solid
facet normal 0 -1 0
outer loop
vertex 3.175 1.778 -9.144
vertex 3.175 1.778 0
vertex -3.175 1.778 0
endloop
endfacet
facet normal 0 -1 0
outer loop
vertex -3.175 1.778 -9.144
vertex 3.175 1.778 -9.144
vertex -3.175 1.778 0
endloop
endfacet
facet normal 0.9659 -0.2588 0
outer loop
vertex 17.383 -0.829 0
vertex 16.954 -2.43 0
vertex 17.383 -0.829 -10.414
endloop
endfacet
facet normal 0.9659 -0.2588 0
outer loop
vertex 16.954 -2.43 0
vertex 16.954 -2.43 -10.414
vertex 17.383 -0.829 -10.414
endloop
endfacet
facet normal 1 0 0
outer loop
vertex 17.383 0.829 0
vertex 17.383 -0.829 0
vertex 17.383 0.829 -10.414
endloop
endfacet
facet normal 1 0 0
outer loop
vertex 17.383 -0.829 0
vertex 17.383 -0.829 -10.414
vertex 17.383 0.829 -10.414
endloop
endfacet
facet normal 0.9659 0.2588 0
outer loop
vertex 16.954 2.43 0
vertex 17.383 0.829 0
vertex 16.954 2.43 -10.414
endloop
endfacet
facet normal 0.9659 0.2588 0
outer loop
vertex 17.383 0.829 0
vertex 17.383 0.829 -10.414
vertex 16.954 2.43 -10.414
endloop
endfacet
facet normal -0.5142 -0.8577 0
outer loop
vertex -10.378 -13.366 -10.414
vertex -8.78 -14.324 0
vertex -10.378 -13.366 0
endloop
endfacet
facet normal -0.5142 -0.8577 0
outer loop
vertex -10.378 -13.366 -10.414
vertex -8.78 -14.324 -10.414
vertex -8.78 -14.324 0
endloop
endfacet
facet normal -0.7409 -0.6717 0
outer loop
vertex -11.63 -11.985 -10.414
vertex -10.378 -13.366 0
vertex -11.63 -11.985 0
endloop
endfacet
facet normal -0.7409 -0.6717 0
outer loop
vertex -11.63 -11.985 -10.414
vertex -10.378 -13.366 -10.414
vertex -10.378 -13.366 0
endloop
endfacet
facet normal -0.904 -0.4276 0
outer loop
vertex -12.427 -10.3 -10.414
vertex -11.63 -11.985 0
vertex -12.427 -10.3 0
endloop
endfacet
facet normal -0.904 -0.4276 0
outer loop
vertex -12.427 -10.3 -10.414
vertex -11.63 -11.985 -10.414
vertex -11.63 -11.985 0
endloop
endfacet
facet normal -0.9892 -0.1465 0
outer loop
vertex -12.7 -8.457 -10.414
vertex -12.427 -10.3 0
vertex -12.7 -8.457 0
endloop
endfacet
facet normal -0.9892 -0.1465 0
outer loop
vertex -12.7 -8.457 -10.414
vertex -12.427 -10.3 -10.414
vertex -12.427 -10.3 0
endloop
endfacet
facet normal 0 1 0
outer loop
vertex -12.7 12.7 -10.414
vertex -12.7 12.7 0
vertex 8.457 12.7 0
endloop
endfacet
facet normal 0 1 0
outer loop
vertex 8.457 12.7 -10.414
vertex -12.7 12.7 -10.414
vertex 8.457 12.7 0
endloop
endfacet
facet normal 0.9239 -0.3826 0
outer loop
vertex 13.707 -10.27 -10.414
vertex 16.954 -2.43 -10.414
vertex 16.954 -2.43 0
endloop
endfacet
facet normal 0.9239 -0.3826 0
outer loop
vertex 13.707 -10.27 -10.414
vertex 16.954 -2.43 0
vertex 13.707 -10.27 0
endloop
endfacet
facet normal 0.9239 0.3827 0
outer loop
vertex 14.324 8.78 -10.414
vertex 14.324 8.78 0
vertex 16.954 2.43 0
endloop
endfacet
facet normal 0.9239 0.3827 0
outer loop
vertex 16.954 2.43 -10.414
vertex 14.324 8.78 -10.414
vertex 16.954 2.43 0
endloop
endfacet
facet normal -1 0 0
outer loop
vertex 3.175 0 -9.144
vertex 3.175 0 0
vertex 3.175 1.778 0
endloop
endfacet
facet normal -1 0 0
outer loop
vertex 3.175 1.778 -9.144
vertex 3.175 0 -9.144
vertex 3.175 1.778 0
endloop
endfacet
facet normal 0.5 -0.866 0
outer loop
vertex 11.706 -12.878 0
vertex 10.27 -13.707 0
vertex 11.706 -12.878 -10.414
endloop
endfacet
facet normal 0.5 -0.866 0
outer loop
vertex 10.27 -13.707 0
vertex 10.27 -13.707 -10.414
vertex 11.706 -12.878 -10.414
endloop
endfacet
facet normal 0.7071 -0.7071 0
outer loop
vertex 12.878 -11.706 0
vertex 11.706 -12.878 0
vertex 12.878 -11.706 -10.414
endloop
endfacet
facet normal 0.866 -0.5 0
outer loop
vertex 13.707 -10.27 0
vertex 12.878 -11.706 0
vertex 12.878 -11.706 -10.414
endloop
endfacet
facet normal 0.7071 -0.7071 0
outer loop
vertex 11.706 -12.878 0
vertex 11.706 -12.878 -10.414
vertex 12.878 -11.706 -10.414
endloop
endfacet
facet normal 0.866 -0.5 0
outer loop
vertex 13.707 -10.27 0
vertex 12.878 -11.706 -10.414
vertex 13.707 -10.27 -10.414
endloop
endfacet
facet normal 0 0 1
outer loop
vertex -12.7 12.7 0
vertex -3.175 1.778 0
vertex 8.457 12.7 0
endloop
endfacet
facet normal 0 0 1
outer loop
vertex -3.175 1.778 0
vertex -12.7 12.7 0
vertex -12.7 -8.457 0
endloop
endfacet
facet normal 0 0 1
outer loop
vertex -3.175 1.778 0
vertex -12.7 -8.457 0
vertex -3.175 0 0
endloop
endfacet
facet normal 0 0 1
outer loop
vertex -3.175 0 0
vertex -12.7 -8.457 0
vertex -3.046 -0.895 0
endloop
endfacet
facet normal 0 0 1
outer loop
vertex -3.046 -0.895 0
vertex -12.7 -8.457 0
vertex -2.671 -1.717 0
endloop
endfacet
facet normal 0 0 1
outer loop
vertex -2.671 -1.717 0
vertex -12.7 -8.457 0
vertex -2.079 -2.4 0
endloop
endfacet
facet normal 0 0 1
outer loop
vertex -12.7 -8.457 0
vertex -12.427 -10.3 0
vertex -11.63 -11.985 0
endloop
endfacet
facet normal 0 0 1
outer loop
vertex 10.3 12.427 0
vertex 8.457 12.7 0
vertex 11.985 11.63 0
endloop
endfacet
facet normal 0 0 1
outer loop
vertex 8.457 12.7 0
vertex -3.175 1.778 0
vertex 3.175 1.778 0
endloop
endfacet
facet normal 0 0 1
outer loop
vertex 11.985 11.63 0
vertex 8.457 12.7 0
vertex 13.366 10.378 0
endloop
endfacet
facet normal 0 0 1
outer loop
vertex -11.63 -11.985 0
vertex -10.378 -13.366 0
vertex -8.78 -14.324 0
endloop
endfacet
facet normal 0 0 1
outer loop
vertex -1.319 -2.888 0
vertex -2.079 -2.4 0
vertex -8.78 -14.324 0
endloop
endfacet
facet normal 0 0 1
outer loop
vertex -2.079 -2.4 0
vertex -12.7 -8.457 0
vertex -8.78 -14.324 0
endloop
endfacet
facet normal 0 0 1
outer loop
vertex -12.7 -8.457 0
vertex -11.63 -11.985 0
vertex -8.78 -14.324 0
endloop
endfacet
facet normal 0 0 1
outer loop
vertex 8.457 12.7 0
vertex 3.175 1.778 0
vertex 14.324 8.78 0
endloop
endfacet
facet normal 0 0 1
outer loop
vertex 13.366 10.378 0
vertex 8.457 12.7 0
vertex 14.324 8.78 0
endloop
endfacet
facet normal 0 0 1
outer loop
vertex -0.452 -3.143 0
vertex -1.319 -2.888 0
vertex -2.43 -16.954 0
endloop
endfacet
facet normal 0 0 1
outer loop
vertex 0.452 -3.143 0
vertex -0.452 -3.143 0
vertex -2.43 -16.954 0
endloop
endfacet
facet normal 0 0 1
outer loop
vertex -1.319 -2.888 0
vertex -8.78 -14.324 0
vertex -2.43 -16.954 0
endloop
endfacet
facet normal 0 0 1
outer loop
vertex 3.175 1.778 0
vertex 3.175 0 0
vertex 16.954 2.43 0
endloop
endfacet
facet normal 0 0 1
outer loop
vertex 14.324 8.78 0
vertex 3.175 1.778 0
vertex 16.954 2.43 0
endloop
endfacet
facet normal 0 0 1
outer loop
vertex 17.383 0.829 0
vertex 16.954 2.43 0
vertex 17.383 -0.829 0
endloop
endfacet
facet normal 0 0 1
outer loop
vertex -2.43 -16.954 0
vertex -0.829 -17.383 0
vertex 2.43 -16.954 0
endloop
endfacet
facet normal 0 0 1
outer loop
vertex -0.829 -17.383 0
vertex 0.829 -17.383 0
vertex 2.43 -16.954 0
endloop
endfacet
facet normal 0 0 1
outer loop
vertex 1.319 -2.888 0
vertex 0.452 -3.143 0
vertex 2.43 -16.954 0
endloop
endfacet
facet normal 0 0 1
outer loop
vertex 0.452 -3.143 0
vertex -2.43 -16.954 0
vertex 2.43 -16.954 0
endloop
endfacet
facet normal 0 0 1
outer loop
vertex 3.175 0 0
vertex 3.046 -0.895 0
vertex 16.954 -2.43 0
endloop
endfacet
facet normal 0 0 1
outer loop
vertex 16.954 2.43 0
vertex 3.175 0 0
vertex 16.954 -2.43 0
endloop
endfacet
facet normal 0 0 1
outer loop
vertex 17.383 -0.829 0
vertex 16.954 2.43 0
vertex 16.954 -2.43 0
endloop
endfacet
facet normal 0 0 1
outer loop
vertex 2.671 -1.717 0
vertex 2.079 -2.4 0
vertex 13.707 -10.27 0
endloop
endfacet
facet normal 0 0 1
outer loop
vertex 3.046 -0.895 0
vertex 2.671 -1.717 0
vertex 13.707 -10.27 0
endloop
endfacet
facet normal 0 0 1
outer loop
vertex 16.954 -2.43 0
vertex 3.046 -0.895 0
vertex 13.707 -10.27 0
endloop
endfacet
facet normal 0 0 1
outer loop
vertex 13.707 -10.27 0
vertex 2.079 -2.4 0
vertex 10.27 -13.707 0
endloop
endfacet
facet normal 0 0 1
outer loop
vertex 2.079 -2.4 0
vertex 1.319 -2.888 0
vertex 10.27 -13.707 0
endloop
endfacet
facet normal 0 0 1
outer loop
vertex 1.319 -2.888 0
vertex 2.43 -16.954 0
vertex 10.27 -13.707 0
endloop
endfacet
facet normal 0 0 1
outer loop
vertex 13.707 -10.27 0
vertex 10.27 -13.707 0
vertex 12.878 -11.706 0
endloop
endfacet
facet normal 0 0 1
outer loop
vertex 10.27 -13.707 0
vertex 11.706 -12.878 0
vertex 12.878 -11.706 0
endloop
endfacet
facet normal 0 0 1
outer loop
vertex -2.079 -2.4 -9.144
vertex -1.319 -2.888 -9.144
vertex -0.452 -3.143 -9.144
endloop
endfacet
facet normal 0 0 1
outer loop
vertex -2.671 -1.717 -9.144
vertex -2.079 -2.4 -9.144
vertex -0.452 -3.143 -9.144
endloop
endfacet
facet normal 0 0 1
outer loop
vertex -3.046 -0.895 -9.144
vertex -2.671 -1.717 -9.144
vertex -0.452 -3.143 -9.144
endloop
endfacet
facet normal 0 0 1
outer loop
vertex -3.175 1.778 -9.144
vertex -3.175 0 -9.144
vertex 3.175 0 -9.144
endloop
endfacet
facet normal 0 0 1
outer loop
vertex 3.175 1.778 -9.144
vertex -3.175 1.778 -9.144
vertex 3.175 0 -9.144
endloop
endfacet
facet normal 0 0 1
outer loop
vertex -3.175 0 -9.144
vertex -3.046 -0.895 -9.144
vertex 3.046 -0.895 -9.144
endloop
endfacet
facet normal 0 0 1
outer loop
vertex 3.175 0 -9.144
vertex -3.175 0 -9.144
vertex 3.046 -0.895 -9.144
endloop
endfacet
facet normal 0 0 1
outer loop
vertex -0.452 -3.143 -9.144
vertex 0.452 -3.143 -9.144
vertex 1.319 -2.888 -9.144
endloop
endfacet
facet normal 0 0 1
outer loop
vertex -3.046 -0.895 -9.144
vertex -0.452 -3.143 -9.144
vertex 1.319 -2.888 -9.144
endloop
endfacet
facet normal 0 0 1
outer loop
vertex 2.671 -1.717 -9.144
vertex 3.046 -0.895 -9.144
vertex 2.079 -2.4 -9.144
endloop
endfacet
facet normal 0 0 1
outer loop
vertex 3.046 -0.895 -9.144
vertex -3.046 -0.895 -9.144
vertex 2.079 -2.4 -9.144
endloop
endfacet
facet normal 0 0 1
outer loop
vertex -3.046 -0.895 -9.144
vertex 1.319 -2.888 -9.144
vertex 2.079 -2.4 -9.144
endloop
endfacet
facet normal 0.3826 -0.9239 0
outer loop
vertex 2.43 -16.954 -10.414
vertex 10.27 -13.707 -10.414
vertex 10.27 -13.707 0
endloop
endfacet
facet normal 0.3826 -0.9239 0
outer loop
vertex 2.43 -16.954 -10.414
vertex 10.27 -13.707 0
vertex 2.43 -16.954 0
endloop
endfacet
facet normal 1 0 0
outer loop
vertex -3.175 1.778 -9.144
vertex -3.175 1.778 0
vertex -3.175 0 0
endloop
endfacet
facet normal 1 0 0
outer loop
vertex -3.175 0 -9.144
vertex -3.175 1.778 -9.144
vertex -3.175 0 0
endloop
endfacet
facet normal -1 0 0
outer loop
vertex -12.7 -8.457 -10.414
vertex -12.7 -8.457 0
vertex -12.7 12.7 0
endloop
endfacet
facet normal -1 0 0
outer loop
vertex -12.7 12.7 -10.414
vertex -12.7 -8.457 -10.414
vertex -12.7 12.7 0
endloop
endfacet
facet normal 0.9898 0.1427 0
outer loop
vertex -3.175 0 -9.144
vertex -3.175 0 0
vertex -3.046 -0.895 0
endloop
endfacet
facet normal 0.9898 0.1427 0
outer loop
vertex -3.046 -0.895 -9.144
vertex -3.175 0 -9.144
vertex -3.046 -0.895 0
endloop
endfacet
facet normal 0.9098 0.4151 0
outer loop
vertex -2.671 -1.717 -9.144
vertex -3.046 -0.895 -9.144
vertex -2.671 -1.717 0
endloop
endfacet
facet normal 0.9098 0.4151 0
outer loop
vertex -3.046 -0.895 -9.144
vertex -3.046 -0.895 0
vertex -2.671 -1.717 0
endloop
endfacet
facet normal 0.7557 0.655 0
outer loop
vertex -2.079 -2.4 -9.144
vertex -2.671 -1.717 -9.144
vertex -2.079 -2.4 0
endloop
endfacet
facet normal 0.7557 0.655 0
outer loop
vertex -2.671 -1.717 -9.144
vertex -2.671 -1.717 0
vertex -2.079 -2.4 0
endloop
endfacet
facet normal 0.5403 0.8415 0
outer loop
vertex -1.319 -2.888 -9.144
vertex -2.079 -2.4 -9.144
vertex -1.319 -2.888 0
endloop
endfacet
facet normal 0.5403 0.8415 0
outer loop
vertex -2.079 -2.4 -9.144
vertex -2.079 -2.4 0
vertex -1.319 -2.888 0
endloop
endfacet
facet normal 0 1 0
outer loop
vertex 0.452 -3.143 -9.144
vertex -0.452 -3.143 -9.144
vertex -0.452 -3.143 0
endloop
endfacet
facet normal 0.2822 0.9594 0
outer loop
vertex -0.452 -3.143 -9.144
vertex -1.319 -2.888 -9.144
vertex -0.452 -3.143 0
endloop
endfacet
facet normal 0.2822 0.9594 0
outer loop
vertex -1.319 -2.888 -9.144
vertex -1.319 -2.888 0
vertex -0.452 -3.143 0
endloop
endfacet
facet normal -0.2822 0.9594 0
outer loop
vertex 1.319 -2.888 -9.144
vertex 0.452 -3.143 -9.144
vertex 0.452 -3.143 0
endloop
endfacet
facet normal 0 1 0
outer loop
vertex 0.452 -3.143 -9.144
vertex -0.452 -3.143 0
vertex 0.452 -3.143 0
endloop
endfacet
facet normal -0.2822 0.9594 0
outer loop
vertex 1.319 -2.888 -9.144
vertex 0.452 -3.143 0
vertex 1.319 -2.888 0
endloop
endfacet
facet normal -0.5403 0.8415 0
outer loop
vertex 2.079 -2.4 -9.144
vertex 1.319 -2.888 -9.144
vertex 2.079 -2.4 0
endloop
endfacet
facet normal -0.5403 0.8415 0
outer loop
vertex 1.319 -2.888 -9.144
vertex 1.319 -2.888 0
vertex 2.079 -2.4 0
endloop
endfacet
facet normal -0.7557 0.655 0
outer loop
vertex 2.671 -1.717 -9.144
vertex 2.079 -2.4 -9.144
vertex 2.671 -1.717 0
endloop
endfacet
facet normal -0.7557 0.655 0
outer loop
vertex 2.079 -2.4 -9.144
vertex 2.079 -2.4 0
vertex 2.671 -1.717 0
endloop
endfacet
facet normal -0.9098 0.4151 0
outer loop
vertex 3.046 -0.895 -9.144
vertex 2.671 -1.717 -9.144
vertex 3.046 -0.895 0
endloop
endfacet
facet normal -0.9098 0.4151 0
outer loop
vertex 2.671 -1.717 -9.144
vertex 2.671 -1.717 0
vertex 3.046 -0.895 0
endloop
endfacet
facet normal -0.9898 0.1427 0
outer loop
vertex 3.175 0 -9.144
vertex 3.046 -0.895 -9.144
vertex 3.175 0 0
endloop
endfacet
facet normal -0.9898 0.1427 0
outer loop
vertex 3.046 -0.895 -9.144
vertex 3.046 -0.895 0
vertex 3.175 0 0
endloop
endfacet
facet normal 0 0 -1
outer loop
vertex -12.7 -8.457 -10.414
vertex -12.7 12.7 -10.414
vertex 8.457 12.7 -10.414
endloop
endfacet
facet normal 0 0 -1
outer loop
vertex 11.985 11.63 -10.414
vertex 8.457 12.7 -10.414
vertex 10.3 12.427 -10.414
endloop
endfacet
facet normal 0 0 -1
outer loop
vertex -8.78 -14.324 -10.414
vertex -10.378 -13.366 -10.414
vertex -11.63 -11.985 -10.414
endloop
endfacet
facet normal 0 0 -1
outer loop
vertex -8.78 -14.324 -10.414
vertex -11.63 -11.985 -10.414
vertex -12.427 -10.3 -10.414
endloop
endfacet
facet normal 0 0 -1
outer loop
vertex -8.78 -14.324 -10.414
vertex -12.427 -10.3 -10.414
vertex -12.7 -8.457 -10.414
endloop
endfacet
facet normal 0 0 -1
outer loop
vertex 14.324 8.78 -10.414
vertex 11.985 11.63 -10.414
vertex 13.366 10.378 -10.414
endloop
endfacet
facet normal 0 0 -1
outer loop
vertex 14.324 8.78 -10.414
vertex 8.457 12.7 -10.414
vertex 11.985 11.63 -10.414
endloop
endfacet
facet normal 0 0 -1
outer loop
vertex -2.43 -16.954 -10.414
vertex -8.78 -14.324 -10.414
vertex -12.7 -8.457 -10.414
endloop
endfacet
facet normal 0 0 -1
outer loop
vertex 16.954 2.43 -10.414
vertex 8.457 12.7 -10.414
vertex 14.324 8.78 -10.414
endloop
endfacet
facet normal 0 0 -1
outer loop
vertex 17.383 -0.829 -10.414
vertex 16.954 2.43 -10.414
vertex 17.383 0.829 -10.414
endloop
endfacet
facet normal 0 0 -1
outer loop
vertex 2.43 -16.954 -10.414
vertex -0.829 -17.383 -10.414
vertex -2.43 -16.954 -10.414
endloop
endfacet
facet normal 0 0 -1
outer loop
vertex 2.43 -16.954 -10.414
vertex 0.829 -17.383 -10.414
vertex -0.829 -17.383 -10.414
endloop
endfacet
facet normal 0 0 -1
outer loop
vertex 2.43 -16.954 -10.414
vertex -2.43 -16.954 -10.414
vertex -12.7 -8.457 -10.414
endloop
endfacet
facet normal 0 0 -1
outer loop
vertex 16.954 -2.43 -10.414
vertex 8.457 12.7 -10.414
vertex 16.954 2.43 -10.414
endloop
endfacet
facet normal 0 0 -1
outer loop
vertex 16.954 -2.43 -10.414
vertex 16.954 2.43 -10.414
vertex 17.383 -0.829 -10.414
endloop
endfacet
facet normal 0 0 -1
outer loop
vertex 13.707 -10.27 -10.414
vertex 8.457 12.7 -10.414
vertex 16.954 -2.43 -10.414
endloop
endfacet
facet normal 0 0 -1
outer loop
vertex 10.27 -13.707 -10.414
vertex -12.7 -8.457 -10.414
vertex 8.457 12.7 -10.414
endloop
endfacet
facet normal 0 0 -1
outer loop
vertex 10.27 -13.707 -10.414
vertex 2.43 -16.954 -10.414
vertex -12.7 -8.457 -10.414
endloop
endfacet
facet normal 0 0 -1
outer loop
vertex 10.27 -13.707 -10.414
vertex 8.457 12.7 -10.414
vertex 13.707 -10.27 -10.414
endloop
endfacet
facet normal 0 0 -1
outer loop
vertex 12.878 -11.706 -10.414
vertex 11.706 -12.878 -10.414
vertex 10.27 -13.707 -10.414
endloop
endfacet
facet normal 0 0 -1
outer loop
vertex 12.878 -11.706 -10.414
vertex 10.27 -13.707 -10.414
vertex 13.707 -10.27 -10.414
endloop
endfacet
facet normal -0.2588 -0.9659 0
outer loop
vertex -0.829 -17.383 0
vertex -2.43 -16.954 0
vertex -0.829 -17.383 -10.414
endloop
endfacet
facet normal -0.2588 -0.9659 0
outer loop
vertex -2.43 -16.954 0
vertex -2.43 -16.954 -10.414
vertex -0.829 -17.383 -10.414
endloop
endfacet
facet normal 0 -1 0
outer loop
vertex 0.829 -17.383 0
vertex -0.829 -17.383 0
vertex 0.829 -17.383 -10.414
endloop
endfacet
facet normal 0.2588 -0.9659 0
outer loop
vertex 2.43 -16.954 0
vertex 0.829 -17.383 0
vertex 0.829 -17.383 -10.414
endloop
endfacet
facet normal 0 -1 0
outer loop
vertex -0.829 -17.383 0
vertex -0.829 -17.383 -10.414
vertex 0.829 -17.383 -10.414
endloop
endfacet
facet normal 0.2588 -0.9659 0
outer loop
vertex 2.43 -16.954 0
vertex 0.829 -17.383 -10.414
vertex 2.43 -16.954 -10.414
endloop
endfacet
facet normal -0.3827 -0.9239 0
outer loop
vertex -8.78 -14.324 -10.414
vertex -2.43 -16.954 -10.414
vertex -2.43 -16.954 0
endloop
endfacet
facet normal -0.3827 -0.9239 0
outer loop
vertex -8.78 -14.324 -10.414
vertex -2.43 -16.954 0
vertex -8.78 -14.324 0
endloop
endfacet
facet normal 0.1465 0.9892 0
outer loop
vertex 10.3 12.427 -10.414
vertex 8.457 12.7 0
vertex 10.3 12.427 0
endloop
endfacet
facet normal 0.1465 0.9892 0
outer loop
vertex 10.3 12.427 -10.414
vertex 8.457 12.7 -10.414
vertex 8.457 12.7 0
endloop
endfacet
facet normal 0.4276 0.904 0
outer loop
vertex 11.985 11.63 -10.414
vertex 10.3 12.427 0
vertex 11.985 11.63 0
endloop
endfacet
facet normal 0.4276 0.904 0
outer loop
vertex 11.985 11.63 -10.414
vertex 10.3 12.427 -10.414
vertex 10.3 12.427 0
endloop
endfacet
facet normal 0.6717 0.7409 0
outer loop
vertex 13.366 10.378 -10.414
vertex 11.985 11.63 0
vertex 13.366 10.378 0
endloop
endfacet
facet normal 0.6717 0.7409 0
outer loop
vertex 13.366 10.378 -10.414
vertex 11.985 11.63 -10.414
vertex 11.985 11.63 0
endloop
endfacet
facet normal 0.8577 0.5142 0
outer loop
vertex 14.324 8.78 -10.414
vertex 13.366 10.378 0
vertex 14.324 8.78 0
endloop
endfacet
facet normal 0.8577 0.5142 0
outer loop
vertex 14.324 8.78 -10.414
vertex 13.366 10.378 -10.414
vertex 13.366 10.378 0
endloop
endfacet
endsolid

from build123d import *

# Parameters (mm, degrees)
F1_DEPTH = 10.414
F3_DEPTH = 1.27
F4_R     = 6.35
F6_ANGLE = 180


with BuildPart() as f1:
    # F0 (on Top) → F1 (new body)
    with BuildSketch(Plane.XY):
        Polygon((0, 17.960512), (-12.7, 12.7), (-12.7, -12.7), (12.7, -12.7), (17.960512, 0), (12.7, 12.7), align=None)
        with BuildLine():
            ThreePointArc((-3.175, 0), (0, 3.175), (3.175, 0))
            Line((3.175, 0), (3.175, -1.778))
            Line((3.175, -1.778), (-3.175, -1.778))
            Line((-3.175, -1.778), (-3.175, 0))
        make_face(mode=Mode.SUBTRACT)
    extrude(amount=F1_DEPTH)

    # F2 (on face) → F3 (join)
    with BuildSketch(Plane.XY.offset(10.414)):
        with BuildLine():
            ThreePointArc((3.175, 0), (0, 3.175), (-3.175, 0))
            Line((-3.175, 0), (-3.175, -1.778))
            Line((-3.175, -1.778), (3.175, -1.778))
            Line((3.175, -1.778), (3.175, 0))
        make_face()
    extrude(amount=-F3_DEPTH)

    # F4
    f4_edges = [f1.edges().sort_by_distance(p)[0] for p in [
        (12.7, -12.7, 5.207),
        (17.960512, 0, 5.207),
        (12.7, 12.7, 5.207),
        (0, 17.960512, 5.207),
        (-12.7, 12.7, 5.207),
    ]]
    fillet(f4_edges, radius=F4_R)


with BuildPart() as f1_1:
    # F6: moved
    add(f1.part.rotate(Axis((10.708487, 0, 0), (1, 0, 0)), F6_ANGLE))


solid = f1_1.part
